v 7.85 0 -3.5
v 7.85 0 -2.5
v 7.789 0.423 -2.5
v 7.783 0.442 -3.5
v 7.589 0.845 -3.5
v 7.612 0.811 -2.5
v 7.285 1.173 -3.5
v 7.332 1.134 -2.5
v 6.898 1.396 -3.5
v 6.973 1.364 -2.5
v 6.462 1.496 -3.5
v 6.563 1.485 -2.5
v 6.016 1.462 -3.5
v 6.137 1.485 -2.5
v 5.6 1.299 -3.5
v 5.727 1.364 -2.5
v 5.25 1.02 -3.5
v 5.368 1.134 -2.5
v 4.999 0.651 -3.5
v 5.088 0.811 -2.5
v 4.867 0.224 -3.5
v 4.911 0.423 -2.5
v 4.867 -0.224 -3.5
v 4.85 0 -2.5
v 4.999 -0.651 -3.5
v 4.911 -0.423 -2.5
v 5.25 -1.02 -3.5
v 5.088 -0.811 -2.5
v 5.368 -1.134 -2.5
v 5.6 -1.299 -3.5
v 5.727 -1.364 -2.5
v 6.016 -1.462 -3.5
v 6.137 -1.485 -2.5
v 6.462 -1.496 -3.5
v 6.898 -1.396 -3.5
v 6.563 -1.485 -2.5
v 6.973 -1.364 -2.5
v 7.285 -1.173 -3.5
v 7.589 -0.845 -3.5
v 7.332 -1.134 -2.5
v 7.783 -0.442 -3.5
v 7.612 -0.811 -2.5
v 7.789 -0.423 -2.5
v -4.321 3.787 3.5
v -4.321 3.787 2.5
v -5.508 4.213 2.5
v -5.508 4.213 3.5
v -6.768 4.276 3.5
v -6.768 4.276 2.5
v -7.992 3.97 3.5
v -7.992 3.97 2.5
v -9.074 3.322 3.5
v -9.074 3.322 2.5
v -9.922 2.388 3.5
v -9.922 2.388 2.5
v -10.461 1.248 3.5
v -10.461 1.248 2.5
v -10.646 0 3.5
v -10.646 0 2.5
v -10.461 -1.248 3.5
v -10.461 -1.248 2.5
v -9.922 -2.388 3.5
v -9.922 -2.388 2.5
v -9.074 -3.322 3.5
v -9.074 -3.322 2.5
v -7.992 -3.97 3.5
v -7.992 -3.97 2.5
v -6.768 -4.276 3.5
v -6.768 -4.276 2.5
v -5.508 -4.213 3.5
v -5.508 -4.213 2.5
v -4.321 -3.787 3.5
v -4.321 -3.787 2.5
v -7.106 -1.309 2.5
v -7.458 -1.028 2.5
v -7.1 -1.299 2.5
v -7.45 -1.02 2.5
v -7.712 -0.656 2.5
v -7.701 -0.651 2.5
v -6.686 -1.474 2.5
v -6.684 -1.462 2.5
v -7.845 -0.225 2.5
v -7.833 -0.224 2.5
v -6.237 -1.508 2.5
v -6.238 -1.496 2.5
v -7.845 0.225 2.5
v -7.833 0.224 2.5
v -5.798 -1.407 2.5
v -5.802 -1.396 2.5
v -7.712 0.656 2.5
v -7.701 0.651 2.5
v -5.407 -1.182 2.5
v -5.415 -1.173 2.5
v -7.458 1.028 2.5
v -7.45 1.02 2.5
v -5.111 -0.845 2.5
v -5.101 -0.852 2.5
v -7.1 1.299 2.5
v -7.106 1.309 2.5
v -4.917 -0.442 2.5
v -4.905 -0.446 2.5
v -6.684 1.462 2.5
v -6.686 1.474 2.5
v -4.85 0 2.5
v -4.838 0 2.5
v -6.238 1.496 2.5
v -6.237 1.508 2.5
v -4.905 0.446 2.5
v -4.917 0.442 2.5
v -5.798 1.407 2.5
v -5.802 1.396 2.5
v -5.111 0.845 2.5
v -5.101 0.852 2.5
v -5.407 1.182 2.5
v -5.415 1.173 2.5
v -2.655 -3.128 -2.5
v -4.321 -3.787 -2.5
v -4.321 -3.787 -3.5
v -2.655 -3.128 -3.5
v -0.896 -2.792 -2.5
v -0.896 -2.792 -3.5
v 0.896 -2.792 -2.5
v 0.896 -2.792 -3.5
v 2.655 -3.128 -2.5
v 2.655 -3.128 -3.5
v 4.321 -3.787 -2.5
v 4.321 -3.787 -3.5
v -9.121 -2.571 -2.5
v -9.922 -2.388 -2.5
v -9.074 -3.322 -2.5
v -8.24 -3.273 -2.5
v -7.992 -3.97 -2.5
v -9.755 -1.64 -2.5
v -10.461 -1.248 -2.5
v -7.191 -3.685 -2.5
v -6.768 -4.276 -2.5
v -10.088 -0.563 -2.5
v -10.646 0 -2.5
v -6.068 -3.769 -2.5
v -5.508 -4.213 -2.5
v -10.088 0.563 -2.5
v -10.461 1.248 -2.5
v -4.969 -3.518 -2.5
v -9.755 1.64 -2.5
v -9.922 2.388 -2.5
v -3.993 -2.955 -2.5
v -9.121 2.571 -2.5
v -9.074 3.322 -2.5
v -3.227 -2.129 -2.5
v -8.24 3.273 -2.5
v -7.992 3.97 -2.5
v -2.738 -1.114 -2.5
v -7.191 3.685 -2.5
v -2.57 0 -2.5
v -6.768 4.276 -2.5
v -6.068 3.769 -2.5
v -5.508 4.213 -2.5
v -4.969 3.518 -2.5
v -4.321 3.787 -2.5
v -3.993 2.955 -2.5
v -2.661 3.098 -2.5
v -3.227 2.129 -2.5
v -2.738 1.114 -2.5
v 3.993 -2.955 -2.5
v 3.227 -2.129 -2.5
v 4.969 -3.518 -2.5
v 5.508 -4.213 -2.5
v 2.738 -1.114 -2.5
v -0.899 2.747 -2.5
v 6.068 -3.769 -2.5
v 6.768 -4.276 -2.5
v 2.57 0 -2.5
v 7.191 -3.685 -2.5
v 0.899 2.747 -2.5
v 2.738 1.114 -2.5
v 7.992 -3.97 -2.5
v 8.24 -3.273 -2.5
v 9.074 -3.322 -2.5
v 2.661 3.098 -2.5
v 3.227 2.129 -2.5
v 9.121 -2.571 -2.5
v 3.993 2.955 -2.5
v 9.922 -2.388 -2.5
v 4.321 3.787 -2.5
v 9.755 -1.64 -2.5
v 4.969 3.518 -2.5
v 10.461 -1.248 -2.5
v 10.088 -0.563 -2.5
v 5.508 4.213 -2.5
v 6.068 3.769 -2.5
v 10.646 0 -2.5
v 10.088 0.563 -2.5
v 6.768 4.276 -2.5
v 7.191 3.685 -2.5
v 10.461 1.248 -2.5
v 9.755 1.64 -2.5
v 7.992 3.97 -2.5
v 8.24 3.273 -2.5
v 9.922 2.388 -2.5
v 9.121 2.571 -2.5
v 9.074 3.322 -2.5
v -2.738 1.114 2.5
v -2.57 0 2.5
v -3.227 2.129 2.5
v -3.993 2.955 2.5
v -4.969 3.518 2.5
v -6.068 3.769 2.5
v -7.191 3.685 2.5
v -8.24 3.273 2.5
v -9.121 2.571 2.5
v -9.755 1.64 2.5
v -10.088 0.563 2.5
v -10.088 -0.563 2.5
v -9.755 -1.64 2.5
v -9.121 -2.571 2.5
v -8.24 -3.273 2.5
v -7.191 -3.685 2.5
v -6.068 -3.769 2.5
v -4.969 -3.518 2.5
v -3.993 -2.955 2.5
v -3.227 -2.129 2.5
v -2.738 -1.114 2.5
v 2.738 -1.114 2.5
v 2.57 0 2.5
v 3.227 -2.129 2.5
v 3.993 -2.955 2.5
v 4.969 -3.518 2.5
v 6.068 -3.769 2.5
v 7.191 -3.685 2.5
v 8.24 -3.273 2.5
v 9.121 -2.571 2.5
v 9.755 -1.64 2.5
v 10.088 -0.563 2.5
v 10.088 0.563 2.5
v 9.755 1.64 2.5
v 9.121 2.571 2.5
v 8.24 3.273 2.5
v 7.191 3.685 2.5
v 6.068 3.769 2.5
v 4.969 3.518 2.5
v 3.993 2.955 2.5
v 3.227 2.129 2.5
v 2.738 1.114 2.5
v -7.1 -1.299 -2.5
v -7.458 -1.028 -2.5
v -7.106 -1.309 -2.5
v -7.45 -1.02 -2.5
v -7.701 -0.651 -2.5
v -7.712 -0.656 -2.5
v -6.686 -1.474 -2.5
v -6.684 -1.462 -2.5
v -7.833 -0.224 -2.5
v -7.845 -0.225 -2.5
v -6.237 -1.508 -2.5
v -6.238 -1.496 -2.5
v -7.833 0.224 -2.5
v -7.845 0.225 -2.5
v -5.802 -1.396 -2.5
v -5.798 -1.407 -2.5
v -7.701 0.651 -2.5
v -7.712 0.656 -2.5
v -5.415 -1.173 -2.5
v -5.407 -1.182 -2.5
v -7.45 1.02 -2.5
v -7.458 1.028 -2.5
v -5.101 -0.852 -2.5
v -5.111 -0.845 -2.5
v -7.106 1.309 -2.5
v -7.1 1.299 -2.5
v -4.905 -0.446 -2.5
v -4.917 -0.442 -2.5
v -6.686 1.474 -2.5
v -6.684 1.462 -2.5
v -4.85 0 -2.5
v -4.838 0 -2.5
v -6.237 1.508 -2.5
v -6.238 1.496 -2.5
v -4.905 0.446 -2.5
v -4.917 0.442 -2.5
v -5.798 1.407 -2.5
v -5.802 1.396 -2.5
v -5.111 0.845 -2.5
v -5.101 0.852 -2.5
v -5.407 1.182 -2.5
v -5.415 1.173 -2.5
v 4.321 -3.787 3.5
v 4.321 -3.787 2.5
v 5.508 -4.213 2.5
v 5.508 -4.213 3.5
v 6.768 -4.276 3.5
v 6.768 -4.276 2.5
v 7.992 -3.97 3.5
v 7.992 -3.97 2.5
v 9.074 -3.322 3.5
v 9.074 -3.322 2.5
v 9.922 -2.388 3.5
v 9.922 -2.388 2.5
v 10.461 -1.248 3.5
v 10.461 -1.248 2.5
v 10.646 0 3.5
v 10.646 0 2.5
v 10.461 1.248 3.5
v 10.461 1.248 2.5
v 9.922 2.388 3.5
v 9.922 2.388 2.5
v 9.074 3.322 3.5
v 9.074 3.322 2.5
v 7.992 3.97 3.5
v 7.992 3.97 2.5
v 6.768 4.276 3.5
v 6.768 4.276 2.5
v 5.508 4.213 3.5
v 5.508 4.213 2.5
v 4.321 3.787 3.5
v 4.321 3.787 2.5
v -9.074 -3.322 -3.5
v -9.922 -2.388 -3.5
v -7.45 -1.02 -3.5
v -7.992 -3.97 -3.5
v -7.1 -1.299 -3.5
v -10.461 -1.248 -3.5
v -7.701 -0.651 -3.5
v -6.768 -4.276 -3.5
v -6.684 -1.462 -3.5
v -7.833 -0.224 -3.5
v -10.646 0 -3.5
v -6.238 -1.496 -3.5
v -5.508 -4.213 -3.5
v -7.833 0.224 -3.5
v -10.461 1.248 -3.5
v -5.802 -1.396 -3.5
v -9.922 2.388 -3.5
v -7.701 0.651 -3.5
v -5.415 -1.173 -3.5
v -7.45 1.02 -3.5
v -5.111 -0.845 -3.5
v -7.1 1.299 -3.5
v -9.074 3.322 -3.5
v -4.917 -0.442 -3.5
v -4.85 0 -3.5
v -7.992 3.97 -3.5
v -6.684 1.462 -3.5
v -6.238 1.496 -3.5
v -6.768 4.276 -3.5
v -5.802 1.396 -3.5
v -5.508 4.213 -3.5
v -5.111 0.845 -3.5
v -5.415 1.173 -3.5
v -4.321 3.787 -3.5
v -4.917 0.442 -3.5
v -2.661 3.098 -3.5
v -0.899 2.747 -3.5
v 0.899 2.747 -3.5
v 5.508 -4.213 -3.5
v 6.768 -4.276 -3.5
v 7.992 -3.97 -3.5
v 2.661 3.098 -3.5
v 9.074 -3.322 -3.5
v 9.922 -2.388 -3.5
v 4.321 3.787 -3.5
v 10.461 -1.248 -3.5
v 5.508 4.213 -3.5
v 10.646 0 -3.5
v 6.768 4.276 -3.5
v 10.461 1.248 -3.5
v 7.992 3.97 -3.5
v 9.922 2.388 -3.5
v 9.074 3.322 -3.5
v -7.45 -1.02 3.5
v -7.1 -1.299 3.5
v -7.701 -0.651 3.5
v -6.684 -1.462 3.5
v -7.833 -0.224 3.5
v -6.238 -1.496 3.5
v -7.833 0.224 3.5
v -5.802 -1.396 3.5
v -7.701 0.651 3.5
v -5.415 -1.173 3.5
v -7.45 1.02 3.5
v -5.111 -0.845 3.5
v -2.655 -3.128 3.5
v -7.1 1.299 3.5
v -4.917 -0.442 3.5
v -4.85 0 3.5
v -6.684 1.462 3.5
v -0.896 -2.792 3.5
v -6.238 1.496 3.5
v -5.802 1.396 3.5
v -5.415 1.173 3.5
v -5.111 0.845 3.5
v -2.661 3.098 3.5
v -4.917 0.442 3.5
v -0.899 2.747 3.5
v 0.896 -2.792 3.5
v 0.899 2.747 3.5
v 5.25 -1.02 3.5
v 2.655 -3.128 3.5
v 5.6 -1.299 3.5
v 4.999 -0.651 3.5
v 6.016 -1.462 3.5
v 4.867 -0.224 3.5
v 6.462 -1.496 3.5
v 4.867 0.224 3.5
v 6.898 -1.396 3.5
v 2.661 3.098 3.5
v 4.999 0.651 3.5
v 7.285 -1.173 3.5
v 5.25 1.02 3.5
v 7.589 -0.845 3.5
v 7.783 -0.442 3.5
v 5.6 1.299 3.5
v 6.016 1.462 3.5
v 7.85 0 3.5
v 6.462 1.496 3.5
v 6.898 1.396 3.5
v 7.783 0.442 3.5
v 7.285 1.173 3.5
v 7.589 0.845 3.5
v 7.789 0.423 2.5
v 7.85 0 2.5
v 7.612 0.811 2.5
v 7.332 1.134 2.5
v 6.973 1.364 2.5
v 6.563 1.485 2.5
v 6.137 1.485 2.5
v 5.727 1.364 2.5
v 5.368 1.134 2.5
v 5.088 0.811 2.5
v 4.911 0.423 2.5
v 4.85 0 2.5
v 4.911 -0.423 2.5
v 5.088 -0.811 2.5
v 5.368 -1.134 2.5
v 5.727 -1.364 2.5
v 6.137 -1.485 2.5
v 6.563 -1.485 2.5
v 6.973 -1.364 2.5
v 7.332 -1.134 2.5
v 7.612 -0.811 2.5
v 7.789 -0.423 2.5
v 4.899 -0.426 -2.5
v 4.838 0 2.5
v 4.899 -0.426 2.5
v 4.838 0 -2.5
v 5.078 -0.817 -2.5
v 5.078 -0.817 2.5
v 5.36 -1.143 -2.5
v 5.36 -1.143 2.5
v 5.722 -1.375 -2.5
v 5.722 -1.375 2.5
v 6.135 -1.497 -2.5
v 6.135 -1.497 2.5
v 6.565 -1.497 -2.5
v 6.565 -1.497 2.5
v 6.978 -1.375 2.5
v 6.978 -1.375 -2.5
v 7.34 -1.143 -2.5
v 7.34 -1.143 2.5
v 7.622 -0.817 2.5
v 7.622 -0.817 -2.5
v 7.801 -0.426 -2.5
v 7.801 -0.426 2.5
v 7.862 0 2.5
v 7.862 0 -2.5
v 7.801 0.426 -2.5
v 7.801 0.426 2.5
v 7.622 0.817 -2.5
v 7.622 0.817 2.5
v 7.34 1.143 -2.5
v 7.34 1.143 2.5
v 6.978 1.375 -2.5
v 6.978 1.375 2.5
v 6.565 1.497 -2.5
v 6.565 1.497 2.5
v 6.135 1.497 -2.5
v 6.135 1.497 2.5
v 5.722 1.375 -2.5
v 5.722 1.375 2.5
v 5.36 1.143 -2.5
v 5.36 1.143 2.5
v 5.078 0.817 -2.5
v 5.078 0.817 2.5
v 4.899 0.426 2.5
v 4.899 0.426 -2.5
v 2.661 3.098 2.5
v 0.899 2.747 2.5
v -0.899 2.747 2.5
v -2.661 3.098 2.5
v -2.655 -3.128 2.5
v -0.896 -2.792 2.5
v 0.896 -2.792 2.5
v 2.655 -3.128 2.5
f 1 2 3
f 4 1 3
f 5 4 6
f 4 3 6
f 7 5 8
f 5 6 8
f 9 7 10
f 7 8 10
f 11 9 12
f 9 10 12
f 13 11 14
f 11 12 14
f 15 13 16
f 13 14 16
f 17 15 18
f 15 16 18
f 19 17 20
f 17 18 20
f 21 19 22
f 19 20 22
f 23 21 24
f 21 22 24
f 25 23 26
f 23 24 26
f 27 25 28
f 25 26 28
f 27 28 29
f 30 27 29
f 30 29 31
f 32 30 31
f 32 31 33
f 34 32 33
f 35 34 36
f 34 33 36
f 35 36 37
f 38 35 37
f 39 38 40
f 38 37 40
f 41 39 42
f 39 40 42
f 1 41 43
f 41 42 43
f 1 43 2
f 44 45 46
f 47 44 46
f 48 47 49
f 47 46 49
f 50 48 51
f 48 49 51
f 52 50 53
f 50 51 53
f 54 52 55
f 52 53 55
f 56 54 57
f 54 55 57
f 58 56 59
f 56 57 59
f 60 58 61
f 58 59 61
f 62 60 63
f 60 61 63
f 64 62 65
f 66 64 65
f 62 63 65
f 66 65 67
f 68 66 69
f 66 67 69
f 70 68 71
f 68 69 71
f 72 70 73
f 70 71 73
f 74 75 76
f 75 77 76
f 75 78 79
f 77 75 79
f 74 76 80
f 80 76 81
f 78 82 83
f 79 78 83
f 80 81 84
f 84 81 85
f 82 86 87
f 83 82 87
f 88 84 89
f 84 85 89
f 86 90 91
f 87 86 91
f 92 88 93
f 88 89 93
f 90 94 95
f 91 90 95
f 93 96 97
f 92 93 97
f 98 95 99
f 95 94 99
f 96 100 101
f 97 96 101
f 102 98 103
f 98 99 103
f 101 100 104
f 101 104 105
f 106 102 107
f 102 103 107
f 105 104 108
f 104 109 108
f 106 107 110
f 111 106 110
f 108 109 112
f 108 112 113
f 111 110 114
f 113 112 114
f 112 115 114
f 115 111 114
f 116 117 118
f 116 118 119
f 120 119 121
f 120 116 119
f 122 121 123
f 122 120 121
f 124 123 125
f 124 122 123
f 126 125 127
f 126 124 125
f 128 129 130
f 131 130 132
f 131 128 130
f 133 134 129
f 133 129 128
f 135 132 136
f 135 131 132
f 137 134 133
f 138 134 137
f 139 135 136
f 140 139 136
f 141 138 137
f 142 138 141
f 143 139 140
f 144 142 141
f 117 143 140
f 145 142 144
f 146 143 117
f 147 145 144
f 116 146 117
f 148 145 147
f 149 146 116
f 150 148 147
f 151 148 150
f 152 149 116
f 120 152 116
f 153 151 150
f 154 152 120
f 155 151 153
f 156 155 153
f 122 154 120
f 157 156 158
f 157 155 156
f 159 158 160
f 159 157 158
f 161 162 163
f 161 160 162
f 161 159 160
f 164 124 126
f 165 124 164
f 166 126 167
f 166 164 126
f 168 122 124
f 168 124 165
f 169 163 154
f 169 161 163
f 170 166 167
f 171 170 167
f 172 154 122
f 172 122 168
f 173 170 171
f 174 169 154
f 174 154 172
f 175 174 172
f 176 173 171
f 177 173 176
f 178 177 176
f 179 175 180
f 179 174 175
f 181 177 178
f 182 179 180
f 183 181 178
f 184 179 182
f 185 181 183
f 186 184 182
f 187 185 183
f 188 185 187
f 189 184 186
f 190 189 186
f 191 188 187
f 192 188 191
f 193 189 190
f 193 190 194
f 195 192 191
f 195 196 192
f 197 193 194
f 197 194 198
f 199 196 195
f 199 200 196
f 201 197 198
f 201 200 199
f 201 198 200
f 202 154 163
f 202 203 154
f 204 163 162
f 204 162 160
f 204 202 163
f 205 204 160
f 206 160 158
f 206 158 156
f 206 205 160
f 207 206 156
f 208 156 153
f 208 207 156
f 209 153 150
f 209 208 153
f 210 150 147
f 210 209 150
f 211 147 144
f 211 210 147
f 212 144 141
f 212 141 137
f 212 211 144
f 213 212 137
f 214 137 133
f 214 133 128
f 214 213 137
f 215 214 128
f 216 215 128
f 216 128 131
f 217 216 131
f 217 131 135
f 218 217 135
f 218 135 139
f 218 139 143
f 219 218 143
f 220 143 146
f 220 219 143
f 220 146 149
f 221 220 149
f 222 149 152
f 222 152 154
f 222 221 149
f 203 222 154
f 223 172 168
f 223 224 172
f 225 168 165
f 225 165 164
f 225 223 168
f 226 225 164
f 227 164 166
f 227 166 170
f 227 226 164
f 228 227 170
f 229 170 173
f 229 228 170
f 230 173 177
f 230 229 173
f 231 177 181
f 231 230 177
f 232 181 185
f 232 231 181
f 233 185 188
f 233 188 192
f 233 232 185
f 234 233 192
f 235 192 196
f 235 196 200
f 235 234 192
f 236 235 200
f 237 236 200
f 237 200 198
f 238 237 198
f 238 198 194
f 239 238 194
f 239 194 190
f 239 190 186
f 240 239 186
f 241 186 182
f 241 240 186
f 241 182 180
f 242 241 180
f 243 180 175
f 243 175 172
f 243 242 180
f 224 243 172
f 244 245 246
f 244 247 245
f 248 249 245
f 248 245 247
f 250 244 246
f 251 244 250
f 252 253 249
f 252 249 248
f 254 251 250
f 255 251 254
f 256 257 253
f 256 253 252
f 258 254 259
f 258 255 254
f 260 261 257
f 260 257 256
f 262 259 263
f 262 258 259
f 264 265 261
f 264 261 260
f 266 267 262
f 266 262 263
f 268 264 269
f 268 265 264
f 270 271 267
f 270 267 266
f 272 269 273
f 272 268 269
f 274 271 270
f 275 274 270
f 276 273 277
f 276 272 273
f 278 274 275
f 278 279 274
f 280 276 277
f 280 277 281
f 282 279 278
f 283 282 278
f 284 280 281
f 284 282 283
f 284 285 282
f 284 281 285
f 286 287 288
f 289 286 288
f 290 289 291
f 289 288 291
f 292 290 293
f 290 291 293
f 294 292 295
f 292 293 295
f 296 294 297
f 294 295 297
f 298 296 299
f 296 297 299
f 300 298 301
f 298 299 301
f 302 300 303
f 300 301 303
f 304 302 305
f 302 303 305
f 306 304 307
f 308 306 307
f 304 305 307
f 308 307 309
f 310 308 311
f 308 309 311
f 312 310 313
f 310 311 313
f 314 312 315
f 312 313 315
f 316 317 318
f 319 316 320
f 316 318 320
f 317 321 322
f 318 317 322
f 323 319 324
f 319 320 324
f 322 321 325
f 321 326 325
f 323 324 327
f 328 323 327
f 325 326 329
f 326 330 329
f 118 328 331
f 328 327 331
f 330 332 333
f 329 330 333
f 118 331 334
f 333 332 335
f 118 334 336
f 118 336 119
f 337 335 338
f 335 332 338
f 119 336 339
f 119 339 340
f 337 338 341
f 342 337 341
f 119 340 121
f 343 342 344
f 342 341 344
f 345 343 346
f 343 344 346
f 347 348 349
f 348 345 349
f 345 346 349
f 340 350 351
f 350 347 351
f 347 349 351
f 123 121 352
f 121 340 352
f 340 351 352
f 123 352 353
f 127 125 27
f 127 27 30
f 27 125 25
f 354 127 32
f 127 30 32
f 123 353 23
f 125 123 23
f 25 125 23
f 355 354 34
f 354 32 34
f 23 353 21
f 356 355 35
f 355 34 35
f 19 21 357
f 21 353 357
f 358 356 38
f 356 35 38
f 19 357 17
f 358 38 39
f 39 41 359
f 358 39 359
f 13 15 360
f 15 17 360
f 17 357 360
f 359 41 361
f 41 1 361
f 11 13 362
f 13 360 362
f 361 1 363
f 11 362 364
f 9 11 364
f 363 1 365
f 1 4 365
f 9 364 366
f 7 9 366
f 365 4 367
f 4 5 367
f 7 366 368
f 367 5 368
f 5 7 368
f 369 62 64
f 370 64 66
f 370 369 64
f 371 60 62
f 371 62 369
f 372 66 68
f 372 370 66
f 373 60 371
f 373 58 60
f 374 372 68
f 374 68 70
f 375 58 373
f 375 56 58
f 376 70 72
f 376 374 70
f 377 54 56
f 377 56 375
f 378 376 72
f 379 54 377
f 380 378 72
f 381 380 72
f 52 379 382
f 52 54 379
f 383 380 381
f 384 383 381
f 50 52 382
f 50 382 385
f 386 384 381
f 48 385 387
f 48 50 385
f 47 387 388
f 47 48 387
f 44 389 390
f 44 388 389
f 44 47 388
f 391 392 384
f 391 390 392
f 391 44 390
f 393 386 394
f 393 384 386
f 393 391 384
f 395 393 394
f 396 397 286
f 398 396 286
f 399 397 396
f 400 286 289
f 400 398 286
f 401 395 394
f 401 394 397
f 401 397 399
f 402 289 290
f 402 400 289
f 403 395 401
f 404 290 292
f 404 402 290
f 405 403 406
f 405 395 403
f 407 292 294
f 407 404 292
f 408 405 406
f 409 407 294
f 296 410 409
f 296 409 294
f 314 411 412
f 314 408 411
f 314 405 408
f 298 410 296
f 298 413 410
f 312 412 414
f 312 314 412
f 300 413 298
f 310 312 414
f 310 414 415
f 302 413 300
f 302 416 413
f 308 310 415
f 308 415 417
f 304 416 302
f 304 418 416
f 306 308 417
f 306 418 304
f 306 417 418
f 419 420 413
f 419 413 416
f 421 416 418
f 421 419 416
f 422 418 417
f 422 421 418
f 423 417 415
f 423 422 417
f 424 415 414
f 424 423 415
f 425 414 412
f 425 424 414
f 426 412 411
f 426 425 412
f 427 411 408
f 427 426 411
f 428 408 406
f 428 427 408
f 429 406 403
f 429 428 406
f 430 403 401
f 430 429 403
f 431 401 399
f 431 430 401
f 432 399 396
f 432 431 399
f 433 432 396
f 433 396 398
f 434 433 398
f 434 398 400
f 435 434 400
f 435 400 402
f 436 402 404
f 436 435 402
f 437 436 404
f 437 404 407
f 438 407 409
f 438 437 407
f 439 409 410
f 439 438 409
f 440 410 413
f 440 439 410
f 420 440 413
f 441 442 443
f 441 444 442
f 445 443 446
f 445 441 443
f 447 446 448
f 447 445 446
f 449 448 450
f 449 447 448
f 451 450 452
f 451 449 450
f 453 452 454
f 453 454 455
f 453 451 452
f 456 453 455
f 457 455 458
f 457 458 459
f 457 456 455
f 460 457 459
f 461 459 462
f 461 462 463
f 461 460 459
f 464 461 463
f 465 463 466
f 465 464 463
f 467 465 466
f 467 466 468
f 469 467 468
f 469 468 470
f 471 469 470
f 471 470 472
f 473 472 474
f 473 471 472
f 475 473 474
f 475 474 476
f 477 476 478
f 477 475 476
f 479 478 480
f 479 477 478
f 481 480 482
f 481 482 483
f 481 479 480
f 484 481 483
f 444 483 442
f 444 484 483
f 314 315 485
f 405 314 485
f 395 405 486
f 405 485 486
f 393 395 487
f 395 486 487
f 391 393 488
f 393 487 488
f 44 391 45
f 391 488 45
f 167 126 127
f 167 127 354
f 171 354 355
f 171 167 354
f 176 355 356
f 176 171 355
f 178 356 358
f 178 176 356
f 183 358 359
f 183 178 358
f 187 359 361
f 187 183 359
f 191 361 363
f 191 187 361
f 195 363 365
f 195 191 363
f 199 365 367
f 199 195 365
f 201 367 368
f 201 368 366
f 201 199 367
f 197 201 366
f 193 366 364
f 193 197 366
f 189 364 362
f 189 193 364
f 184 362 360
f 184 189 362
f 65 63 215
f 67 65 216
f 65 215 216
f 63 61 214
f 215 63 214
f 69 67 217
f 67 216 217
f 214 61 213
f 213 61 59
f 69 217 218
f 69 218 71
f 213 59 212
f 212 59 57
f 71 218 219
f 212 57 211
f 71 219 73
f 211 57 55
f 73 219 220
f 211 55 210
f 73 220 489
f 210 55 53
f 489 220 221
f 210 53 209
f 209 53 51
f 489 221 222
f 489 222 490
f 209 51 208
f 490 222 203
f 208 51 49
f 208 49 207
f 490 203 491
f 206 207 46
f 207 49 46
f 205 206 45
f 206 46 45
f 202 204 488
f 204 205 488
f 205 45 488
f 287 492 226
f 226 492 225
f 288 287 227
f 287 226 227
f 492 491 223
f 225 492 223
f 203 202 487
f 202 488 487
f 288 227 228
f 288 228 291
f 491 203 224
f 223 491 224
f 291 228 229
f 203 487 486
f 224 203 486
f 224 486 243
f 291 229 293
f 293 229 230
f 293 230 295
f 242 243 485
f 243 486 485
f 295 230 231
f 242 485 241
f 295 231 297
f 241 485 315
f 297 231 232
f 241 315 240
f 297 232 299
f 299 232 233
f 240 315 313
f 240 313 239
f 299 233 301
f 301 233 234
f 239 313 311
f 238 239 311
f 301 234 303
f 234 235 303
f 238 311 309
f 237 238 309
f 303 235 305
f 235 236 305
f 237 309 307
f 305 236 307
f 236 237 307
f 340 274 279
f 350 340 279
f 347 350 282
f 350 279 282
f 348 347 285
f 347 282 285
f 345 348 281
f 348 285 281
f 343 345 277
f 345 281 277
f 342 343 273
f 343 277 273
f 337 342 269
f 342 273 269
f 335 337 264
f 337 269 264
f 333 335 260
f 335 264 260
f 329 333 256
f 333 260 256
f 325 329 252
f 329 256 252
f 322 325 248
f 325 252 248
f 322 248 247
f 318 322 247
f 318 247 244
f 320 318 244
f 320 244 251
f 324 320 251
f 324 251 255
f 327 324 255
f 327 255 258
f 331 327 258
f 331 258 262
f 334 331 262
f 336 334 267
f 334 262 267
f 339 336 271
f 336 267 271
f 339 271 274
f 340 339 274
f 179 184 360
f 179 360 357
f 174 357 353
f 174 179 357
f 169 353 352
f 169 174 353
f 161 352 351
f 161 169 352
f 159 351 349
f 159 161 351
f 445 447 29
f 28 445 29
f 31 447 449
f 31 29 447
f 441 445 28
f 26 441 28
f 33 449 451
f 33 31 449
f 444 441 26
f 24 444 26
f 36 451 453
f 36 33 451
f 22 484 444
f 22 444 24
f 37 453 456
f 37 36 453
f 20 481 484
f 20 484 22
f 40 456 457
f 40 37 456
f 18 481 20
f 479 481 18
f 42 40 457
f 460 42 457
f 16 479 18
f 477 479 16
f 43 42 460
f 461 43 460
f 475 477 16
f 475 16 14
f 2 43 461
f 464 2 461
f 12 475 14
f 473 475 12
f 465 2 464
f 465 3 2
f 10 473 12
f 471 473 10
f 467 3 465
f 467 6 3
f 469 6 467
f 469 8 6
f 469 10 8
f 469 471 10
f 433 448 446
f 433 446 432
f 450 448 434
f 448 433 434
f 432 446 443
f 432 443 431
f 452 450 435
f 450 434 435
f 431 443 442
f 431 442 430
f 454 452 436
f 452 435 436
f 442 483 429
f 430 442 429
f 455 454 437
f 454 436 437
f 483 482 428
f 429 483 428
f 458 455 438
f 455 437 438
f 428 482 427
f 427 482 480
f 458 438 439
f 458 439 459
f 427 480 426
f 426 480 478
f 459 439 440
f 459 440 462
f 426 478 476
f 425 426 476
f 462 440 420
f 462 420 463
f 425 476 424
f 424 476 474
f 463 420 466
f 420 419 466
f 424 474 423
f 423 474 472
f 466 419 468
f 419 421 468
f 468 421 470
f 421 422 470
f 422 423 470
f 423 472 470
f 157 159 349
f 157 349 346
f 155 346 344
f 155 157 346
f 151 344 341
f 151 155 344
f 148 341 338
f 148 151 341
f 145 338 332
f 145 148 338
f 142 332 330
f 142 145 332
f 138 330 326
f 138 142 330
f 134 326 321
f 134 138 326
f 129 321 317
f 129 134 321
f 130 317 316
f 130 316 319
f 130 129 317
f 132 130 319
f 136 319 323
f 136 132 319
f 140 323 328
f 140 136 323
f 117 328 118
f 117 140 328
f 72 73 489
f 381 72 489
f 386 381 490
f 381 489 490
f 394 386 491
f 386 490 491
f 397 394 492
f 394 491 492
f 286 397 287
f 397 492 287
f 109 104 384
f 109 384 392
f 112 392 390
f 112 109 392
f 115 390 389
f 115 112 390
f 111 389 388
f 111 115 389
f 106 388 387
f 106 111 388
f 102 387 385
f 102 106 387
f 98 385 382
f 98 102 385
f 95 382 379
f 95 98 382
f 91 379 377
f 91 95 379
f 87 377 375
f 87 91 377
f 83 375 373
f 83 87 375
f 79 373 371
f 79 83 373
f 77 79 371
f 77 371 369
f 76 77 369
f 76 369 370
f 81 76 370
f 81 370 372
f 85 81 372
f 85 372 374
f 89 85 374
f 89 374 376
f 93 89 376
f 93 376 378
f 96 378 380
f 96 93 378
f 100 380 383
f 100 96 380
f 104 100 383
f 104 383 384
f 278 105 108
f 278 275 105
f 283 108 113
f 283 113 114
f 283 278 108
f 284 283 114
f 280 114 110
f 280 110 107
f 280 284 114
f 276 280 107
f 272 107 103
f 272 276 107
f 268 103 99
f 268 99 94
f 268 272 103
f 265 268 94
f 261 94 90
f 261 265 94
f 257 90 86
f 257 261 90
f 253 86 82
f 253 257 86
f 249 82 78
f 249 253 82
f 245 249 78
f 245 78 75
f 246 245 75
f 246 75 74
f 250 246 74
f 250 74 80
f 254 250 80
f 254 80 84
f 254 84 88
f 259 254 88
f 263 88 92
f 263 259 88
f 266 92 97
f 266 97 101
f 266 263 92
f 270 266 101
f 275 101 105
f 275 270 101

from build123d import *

# Parameters (mm, degrees)
SKETCH1_R             = 3.779761905
SKETCH1_R_2           = 1.511904762
BOSS_EXTRUDE1_DEPTH   = 2.5
BOSS_EXTRUDE1_2_DEPTH = 2.5
SKETCH2_R             = 1.5
BOSS_EXTRUDE2_DEPTH   = 1


with BuildPart() as part:
    # Sketch1 → Boss-Extrude1 (new, symmetric)
    with BuildSketch(Plane.XY):
        with Locations((-6.35, 0)):
            Circle(SKETCH1_R)
        with Locations((-6.35, 0)):
            Circle(SKETCH1_R_2, mode=Mode.SUBTRACT)
    extrude(amount=BOSS_EXTRUDE1_DEPTH, both=True)



with BuildPart() as body_2:
    # Sketch1 → Boss-Extrude1 2 (new, symmetric)
    with BuildSketch(Plane.XY):
        with Locations(Location((6.35, 0, 0), (0, 0, 180))):
            Circle(SKETCH1_R)
        with Locations(Location((6.35, 0, 0), (0, 0, 180))):
            Circle(SKETCH1_R_2, mode=Mode.SUBTRACT)
    extrude(amount=BOSS_EXTRUDE1_2_DEPTH, both=True)


with BuildPart() as part_1:
    add(part.part)

    add(body_2.part)  # Boss-Extrude2 merges body 2
    # Sketch2 → Boss-Extrude2 (add)
    with BuildSketch(Plane.XY.offset(-2.5)):
        with BuildLine():
            ThreePointArc((-4.321104387, 3.787065053), (-10.646309943, 0), (-4.321104387, -3.787065053))
            ThreePointArc((-4.321104387, -3.787065053), (0, -2.75), (4.321104387, -3.787065053))
            ThreePointArc((4.321104387, -3.787065053), (10.646309943, 0), (4.321104387, 3.787065053))
            ThreePointArc((4.321104387, 3.787065053), (0, 2.702484697), (-4.321104387, 3.787065053))
        make_face()
        with Locations((6.35, 0)):
            Circle(SKETCH2_R, mode=Mode.SUBTRACT)
        with Locations((-6.35, 0)):
            Circle(SKETCH2_R, mode=Mode.SUBTRACT)
    boss_extrude2 = extrude(amount=-BOSS_EXTRUDE2_DEPTH)

    # Mirror1: Boss-Extrude2 across plane
    add(boss_extrude2.mirror(Plane.XY))


solid = part_1.part
